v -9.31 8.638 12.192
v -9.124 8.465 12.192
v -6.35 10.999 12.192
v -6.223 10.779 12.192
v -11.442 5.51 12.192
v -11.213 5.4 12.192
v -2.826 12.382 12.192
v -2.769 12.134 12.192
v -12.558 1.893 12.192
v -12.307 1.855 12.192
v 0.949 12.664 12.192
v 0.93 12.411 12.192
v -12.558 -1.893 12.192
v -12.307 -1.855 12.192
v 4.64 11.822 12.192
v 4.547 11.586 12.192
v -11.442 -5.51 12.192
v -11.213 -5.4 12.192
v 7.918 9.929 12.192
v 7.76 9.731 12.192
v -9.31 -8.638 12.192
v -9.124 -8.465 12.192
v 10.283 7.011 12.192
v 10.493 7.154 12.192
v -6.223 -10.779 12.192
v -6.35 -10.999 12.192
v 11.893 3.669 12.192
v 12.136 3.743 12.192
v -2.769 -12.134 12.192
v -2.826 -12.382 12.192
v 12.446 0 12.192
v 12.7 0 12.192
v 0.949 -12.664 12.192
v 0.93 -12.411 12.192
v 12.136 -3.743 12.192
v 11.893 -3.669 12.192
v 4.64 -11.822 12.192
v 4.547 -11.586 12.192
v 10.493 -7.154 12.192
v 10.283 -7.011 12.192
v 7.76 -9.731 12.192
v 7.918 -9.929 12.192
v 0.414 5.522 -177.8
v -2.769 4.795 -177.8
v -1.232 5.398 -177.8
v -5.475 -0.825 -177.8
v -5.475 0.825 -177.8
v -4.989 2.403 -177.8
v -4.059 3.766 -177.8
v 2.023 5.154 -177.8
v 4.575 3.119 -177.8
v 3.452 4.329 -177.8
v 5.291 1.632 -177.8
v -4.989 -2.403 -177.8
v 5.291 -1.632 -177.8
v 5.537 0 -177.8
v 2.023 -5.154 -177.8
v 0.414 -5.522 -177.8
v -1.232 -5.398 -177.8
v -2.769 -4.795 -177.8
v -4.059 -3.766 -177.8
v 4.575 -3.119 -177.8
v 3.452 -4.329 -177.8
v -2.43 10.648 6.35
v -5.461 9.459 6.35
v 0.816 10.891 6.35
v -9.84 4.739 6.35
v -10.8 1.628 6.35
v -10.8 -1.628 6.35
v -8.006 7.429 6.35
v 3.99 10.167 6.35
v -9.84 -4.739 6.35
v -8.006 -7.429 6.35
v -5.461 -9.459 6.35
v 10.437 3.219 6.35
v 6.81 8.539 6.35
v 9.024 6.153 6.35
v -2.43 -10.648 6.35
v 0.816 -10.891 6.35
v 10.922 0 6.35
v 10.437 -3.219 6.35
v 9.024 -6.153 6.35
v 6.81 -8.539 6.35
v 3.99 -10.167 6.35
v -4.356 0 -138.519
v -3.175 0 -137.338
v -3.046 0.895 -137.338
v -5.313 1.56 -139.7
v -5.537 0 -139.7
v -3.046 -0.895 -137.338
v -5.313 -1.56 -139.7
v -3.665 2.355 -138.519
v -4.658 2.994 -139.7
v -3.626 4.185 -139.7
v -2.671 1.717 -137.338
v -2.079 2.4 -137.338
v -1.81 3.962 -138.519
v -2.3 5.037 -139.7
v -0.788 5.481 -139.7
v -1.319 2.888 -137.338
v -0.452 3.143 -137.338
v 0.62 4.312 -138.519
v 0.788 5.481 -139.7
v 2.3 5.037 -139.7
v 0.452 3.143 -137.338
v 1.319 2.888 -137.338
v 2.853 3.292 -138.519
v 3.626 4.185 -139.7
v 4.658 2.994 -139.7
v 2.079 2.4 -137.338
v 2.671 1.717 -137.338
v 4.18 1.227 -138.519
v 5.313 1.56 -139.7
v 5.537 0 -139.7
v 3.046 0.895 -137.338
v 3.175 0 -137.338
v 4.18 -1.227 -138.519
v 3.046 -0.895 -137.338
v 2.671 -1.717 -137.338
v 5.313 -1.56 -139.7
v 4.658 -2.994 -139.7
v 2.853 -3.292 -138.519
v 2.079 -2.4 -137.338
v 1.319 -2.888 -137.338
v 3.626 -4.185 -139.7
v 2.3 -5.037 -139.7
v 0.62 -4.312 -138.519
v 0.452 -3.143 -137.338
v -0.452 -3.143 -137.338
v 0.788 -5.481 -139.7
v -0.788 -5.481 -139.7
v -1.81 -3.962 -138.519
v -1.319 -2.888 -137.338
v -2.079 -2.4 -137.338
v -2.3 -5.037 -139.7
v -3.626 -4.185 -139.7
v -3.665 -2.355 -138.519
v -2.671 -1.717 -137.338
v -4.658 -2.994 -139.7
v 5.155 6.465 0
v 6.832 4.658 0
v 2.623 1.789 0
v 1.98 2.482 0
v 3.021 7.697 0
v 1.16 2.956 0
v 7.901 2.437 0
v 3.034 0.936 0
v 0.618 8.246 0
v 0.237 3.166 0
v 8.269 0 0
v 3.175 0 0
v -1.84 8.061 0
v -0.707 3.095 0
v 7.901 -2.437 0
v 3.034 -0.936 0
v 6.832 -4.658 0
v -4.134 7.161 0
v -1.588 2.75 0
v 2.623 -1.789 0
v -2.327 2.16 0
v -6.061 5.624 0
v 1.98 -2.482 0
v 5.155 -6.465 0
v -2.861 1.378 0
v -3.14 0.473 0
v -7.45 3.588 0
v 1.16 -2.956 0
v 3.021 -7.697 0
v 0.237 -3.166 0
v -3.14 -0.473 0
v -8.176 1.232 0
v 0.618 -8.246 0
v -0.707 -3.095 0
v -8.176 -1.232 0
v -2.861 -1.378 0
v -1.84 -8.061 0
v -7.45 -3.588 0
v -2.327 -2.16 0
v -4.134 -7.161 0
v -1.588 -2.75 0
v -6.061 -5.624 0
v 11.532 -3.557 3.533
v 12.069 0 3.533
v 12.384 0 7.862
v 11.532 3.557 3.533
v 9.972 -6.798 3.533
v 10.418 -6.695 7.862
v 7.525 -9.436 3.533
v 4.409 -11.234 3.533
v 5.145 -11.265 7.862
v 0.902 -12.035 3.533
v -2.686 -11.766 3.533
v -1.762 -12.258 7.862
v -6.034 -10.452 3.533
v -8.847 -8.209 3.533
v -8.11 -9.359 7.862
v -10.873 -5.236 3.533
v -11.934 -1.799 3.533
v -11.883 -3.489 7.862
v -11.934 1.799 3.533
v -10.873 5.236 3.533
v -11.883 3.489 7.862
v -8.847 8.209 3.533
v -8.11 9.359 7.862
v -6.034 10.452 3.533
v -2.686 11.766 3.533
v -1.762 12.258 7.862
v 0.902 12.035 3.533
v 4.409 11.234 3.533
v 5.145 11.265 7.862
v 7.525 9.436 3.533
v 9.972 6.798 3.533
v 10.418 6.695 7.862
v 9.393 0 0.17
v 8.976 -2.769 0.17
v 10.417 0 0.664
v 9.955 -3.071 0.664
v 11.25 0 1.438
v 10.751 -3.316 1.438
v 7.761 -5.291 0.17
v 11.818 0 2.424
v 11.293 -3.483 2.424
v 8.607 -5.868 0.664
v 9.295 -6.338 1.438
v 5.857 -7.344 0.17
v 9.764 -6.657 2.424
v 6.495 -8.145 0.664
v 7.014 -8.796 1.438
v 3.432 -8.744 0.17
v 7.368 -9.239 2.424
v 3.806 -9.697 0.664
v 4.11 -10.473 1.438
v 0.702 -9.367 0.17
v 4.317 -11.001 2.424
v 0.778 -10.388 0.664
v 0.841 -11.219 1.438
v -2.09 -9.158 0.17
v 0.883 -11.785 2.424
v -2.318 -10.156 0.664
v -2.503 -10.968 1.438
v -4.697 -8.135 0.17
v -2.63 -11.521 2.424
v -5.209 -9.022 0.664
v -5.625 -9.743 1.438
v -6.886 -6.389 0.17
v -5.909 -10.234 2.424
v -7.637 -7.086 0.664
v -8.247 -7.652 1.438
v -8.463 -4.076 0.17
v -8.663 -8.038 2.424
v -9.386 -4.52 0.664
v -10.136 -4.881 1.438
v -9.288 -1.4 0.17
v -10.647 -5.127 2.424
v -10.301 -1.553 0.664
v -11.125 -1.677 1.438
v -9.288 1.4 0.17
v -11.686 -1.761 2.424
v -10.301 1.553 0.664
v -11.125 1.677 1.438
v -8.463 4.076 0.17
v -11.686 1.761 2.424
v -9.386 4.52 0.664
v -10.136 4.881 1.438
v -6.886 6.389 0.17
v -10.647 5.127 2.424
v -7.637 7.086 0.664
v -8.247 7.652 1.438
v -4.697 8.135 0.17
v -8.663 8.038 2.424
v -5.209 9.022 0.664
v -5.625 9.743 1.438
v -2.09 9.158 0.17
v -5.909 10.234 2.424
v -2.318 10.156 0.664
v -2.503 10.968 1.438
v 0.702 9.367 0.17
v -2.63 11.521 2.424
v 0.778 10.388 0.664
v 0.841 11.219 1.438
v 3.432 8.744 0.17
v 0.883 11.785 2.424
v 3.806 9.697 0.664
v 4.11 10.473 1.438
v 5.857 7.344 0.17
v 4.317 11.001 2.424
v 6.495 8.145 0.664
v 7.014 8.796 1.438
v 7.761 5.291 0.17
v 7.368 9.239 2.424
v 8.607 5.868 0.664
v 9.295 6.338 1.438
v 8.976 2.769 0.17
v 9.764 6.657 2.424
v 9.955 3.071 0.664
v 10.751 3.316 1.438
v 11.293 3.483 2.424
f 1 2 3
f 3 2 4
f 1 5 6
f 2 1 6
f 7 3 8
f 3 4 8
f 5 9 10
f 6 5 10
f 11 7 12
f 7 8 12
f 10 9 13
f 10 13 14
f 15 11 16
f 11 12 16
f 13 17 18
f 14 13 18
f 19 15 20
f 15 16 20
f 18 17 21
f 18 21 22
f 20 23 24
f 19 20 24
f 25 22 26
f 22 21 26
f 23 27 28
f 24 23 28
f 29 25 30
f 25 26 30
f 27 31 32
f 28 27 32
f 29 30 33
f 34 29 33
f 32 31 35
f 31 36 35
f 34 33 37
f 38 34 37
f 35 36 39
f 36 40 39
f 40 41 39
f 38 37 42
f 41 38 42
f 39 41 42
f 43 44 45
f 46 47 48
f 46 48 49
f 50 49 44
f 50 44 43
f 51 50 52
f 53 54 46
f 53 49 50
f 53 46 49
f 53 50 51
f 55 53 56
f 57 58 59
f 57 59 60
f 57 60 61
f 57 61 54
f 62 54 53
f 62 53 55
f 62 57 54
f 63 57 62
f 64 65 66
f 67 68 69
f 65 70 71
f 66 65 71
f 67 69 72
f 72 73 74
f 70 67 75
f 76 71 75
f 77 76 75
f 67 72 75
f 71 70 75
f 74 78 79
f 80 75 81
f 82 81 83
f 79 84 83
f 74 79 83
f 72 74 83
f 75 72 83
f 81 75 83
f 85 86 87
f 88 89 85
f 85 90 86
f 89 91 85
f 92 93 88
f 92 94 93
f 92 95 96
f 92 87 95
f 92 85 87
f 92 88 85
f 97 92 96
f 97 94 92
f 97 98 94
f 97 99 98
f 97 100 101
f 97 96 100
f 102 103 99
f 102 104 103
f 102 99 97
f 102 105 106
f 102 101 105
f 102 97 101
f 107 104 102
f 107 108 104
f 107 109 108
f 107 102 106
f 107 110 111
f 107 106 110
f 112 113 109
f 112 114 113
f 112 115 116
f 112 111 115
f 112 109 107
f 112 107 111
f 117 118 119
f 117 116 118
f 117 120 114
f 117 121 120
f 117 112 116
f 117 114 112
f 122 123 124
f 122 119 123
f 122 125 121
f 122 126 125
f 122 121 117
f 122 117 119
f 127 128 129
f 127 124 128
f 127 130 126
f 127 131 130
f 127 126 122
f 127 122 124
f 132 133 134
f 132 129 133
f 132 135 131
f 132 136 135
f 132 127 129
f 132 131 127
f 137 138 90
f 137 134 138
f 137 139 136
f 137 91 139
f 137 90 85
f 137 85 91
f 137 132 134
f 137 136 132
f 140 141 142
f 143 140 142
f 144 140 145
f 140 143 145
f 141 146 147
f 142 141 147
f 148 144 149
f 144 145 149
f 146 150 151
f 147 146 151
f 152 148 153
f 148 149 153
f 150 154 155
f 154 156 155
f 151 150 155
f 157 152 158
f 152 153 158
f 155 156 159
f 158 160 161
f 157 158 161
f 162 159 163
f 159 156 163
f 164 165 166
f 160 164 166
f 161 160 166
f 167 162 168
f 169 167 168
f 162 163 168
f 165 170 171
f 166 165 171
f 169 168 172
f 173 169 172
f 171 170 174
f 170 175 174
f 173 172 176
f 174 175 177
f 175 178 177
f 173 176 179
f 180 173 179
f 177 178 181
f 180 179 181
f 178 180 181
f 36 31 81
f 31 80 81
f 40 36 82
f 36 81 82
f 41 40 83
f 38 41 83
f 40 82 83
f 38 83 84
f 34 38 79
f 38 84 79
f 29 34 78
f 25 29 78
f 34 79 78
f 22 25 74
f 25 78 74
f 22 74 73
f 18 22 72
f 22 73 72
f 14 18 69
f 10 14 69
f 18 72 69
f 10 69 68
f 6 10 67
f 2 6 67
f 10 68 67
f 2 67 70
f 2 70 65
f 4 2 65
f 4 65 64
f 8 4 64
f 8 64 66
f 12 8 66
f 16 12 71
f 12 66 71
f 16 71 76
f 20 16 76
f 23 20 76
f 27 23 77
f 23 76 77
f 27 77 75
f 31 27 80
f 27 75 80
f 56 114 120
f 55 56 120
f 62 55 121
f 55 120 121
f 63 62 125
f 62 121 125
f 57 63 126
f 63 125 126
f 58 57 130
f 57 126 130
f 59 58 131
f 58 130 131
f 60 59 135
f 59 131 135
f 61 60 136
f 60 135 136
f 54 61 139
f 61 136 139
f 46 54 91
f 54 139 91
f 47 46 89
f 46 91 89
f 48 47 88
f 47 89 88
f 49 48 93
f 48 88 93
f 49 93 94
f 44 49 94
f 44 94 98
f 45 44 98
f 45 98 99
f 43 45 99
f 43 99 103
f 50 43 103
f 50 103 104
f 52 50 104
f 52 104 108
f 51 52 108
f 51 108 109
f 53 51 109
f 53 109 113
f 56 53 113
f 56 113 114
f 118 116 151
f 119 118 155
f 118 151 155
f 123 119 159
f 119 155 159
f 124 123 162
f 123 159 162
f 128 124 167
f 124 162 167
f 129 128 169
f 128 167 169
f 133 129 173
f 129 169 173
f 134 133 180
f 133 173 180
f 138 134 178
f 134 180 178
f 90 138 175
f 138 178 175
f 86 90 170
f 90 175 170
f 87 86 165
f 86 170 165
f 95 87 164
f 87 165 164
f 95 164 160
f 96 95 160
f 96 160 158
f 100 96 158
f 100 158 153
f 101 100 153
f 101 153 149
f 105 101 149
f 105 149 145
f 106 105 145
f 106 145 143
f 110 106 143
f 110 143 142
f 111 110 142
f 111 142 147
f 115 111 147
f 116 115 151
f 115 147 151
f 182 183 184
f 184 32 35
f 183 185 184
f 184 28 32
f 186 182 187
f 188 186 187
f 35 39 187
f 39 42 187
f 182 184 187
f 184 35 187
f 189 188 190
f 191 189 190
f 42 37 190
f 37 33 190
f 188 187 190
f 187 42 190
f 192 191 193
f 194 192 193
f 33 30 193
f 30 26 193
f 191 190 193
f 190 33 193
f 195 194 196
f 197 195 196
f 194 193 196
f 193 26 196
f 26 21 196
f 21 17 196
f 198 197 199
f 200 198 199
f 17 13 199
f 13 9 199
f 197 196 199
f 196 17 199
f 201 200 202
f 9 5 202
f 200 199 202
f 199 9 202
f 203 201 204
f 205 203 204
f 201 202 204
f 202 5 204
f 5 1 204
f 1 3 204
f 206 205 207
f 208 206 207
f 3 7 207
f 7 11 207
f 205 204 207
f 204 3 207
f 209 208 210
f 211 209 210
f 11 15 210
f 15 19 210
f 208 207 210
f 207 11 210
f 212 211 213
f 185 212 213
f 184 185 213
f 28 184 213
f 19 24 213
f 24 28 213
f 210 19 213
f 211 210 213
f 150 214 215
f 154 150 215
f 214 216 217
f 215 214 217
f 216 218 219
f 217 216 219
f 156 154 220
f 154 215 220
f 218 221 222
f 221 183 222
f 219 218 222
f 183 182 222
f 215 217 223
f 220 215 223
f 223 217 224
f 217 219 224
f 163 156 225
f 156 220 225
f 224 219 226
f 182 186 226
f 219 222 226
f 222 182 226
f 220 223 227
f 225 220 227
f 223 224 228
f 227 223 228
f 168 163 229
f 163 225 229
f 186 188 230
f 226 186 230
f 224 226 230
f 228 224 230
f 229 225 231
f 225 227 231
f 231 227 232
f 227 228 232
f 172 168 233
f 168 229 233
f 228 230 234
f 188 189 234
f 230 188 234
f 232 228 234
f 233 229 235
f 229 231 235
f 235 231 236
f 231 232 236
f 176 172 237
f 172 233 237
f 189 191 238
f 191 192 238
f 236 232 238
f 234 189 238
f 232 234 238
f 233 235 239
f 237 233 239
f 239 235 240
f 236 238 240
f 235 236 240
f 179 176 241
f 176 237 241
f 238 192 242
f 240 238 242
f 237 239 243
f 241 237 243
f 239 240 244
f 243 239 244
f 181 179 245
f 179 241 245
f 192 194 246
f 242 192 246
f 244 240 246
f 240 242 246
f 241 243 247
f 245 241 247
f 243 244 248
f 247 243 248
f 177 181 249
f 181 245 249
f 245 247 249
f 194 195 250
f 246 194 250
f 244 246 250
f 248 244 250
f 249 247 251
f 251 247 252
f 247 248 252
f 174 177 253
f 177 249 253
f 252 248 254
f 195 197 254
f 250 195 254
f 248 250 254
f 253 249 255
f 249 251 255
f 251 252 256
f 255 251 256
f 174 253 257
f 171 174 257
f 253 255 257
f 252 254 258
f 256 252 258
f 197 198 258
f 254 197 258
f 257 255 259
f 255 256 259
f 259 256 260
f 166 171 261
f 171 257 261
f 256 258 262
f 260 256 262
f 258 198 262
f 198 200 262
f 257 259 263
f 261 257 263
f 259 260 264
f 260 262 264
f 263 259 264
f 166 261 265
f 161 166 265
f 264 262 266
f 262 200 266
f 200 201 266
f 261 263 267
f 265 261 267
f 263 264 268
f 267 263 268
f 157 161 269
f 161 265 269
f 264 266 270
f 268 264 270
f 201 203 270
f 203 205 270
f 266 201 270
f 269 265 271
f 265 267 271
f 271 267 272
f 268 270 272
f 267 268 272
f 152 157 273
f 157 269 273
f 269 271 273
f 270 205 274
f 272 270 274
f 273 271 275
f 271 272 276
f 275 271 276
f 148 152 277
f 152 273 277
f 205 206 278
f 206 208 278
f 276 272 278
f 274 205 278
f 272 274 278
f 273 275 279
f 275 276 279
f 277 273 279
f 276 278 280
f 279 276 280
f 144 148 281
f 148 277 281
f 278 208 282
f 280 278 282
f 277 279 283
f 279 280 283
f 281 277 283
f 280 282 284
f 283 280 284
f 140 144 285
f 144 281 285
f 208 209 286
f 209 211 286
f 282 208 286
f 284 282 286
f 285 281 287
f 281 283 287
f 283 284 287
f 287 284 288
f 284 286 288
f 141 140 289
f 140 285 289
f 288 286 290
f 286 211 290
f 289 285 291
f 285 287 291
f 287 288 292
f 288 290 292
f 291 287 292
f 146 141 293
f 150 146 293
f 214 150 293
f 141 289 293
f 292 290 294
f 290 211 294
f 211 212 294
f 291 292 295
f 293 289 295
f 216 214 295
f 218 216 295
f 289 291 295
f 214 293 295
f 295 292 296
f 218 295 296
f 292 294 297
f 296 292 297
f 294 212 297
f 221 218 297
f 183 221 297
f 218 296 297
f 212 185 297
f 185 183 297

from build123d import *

# Parameters (mm, degrees)
F2_R     = 3.81
F3_R     = 3.175
F4_DEPTH = 139.7
F5_R     = 5.5372
F6_DEPTH = 38.1


with BuildPart() as f1:
    # F0 (on Front) → F1 (revolve)
    with BuildSketch(Plane.XZ):
        Polygon((0, 6.35), (0, 0), (11.811, 0), (12.7, 12.192), (12.446, 12.192), (10.922, 6.35), align=None)
    revolve(axis=Axis((0, 0, 3.175), (0, 0, -1)))

    # F2
    f2_edges = [f1.edges().sort_by_distance(p)[0] for p in [
        (-11.811, 0, 0),
    ]]
    fillet(f2_edges, radius=F2_R)

    # F3 (on face) → F4 (join)
    with BuildSketch(Plane(origin=(0, 0, 0), x_dir=(1, 0, 0), z_dir=(0, 0, -1))):
        Circle(F3_R)
    extrude(amount=F4_DEPTH)

    # F5 (on face) → F6 (join)
    with BuildSketch(Plane(origin=(0, 0, -139.7), x_dir=(1, 0, 0), z_dir=(0, 0, -1))):
        Circle(F5_R)
    extrude(amount=F6_DEPTH)

    # F7 (on Front) → F8 (revolve)
    with BuildSketch(Plane.XZ):
        Polygon((-5.5372, -139.7), (0, -139.7), (0, -134.1628), align=None)
    revolve(axis=Axis((0, 0, -136.9314), (0, 0, -1)))


solid = f1.part
